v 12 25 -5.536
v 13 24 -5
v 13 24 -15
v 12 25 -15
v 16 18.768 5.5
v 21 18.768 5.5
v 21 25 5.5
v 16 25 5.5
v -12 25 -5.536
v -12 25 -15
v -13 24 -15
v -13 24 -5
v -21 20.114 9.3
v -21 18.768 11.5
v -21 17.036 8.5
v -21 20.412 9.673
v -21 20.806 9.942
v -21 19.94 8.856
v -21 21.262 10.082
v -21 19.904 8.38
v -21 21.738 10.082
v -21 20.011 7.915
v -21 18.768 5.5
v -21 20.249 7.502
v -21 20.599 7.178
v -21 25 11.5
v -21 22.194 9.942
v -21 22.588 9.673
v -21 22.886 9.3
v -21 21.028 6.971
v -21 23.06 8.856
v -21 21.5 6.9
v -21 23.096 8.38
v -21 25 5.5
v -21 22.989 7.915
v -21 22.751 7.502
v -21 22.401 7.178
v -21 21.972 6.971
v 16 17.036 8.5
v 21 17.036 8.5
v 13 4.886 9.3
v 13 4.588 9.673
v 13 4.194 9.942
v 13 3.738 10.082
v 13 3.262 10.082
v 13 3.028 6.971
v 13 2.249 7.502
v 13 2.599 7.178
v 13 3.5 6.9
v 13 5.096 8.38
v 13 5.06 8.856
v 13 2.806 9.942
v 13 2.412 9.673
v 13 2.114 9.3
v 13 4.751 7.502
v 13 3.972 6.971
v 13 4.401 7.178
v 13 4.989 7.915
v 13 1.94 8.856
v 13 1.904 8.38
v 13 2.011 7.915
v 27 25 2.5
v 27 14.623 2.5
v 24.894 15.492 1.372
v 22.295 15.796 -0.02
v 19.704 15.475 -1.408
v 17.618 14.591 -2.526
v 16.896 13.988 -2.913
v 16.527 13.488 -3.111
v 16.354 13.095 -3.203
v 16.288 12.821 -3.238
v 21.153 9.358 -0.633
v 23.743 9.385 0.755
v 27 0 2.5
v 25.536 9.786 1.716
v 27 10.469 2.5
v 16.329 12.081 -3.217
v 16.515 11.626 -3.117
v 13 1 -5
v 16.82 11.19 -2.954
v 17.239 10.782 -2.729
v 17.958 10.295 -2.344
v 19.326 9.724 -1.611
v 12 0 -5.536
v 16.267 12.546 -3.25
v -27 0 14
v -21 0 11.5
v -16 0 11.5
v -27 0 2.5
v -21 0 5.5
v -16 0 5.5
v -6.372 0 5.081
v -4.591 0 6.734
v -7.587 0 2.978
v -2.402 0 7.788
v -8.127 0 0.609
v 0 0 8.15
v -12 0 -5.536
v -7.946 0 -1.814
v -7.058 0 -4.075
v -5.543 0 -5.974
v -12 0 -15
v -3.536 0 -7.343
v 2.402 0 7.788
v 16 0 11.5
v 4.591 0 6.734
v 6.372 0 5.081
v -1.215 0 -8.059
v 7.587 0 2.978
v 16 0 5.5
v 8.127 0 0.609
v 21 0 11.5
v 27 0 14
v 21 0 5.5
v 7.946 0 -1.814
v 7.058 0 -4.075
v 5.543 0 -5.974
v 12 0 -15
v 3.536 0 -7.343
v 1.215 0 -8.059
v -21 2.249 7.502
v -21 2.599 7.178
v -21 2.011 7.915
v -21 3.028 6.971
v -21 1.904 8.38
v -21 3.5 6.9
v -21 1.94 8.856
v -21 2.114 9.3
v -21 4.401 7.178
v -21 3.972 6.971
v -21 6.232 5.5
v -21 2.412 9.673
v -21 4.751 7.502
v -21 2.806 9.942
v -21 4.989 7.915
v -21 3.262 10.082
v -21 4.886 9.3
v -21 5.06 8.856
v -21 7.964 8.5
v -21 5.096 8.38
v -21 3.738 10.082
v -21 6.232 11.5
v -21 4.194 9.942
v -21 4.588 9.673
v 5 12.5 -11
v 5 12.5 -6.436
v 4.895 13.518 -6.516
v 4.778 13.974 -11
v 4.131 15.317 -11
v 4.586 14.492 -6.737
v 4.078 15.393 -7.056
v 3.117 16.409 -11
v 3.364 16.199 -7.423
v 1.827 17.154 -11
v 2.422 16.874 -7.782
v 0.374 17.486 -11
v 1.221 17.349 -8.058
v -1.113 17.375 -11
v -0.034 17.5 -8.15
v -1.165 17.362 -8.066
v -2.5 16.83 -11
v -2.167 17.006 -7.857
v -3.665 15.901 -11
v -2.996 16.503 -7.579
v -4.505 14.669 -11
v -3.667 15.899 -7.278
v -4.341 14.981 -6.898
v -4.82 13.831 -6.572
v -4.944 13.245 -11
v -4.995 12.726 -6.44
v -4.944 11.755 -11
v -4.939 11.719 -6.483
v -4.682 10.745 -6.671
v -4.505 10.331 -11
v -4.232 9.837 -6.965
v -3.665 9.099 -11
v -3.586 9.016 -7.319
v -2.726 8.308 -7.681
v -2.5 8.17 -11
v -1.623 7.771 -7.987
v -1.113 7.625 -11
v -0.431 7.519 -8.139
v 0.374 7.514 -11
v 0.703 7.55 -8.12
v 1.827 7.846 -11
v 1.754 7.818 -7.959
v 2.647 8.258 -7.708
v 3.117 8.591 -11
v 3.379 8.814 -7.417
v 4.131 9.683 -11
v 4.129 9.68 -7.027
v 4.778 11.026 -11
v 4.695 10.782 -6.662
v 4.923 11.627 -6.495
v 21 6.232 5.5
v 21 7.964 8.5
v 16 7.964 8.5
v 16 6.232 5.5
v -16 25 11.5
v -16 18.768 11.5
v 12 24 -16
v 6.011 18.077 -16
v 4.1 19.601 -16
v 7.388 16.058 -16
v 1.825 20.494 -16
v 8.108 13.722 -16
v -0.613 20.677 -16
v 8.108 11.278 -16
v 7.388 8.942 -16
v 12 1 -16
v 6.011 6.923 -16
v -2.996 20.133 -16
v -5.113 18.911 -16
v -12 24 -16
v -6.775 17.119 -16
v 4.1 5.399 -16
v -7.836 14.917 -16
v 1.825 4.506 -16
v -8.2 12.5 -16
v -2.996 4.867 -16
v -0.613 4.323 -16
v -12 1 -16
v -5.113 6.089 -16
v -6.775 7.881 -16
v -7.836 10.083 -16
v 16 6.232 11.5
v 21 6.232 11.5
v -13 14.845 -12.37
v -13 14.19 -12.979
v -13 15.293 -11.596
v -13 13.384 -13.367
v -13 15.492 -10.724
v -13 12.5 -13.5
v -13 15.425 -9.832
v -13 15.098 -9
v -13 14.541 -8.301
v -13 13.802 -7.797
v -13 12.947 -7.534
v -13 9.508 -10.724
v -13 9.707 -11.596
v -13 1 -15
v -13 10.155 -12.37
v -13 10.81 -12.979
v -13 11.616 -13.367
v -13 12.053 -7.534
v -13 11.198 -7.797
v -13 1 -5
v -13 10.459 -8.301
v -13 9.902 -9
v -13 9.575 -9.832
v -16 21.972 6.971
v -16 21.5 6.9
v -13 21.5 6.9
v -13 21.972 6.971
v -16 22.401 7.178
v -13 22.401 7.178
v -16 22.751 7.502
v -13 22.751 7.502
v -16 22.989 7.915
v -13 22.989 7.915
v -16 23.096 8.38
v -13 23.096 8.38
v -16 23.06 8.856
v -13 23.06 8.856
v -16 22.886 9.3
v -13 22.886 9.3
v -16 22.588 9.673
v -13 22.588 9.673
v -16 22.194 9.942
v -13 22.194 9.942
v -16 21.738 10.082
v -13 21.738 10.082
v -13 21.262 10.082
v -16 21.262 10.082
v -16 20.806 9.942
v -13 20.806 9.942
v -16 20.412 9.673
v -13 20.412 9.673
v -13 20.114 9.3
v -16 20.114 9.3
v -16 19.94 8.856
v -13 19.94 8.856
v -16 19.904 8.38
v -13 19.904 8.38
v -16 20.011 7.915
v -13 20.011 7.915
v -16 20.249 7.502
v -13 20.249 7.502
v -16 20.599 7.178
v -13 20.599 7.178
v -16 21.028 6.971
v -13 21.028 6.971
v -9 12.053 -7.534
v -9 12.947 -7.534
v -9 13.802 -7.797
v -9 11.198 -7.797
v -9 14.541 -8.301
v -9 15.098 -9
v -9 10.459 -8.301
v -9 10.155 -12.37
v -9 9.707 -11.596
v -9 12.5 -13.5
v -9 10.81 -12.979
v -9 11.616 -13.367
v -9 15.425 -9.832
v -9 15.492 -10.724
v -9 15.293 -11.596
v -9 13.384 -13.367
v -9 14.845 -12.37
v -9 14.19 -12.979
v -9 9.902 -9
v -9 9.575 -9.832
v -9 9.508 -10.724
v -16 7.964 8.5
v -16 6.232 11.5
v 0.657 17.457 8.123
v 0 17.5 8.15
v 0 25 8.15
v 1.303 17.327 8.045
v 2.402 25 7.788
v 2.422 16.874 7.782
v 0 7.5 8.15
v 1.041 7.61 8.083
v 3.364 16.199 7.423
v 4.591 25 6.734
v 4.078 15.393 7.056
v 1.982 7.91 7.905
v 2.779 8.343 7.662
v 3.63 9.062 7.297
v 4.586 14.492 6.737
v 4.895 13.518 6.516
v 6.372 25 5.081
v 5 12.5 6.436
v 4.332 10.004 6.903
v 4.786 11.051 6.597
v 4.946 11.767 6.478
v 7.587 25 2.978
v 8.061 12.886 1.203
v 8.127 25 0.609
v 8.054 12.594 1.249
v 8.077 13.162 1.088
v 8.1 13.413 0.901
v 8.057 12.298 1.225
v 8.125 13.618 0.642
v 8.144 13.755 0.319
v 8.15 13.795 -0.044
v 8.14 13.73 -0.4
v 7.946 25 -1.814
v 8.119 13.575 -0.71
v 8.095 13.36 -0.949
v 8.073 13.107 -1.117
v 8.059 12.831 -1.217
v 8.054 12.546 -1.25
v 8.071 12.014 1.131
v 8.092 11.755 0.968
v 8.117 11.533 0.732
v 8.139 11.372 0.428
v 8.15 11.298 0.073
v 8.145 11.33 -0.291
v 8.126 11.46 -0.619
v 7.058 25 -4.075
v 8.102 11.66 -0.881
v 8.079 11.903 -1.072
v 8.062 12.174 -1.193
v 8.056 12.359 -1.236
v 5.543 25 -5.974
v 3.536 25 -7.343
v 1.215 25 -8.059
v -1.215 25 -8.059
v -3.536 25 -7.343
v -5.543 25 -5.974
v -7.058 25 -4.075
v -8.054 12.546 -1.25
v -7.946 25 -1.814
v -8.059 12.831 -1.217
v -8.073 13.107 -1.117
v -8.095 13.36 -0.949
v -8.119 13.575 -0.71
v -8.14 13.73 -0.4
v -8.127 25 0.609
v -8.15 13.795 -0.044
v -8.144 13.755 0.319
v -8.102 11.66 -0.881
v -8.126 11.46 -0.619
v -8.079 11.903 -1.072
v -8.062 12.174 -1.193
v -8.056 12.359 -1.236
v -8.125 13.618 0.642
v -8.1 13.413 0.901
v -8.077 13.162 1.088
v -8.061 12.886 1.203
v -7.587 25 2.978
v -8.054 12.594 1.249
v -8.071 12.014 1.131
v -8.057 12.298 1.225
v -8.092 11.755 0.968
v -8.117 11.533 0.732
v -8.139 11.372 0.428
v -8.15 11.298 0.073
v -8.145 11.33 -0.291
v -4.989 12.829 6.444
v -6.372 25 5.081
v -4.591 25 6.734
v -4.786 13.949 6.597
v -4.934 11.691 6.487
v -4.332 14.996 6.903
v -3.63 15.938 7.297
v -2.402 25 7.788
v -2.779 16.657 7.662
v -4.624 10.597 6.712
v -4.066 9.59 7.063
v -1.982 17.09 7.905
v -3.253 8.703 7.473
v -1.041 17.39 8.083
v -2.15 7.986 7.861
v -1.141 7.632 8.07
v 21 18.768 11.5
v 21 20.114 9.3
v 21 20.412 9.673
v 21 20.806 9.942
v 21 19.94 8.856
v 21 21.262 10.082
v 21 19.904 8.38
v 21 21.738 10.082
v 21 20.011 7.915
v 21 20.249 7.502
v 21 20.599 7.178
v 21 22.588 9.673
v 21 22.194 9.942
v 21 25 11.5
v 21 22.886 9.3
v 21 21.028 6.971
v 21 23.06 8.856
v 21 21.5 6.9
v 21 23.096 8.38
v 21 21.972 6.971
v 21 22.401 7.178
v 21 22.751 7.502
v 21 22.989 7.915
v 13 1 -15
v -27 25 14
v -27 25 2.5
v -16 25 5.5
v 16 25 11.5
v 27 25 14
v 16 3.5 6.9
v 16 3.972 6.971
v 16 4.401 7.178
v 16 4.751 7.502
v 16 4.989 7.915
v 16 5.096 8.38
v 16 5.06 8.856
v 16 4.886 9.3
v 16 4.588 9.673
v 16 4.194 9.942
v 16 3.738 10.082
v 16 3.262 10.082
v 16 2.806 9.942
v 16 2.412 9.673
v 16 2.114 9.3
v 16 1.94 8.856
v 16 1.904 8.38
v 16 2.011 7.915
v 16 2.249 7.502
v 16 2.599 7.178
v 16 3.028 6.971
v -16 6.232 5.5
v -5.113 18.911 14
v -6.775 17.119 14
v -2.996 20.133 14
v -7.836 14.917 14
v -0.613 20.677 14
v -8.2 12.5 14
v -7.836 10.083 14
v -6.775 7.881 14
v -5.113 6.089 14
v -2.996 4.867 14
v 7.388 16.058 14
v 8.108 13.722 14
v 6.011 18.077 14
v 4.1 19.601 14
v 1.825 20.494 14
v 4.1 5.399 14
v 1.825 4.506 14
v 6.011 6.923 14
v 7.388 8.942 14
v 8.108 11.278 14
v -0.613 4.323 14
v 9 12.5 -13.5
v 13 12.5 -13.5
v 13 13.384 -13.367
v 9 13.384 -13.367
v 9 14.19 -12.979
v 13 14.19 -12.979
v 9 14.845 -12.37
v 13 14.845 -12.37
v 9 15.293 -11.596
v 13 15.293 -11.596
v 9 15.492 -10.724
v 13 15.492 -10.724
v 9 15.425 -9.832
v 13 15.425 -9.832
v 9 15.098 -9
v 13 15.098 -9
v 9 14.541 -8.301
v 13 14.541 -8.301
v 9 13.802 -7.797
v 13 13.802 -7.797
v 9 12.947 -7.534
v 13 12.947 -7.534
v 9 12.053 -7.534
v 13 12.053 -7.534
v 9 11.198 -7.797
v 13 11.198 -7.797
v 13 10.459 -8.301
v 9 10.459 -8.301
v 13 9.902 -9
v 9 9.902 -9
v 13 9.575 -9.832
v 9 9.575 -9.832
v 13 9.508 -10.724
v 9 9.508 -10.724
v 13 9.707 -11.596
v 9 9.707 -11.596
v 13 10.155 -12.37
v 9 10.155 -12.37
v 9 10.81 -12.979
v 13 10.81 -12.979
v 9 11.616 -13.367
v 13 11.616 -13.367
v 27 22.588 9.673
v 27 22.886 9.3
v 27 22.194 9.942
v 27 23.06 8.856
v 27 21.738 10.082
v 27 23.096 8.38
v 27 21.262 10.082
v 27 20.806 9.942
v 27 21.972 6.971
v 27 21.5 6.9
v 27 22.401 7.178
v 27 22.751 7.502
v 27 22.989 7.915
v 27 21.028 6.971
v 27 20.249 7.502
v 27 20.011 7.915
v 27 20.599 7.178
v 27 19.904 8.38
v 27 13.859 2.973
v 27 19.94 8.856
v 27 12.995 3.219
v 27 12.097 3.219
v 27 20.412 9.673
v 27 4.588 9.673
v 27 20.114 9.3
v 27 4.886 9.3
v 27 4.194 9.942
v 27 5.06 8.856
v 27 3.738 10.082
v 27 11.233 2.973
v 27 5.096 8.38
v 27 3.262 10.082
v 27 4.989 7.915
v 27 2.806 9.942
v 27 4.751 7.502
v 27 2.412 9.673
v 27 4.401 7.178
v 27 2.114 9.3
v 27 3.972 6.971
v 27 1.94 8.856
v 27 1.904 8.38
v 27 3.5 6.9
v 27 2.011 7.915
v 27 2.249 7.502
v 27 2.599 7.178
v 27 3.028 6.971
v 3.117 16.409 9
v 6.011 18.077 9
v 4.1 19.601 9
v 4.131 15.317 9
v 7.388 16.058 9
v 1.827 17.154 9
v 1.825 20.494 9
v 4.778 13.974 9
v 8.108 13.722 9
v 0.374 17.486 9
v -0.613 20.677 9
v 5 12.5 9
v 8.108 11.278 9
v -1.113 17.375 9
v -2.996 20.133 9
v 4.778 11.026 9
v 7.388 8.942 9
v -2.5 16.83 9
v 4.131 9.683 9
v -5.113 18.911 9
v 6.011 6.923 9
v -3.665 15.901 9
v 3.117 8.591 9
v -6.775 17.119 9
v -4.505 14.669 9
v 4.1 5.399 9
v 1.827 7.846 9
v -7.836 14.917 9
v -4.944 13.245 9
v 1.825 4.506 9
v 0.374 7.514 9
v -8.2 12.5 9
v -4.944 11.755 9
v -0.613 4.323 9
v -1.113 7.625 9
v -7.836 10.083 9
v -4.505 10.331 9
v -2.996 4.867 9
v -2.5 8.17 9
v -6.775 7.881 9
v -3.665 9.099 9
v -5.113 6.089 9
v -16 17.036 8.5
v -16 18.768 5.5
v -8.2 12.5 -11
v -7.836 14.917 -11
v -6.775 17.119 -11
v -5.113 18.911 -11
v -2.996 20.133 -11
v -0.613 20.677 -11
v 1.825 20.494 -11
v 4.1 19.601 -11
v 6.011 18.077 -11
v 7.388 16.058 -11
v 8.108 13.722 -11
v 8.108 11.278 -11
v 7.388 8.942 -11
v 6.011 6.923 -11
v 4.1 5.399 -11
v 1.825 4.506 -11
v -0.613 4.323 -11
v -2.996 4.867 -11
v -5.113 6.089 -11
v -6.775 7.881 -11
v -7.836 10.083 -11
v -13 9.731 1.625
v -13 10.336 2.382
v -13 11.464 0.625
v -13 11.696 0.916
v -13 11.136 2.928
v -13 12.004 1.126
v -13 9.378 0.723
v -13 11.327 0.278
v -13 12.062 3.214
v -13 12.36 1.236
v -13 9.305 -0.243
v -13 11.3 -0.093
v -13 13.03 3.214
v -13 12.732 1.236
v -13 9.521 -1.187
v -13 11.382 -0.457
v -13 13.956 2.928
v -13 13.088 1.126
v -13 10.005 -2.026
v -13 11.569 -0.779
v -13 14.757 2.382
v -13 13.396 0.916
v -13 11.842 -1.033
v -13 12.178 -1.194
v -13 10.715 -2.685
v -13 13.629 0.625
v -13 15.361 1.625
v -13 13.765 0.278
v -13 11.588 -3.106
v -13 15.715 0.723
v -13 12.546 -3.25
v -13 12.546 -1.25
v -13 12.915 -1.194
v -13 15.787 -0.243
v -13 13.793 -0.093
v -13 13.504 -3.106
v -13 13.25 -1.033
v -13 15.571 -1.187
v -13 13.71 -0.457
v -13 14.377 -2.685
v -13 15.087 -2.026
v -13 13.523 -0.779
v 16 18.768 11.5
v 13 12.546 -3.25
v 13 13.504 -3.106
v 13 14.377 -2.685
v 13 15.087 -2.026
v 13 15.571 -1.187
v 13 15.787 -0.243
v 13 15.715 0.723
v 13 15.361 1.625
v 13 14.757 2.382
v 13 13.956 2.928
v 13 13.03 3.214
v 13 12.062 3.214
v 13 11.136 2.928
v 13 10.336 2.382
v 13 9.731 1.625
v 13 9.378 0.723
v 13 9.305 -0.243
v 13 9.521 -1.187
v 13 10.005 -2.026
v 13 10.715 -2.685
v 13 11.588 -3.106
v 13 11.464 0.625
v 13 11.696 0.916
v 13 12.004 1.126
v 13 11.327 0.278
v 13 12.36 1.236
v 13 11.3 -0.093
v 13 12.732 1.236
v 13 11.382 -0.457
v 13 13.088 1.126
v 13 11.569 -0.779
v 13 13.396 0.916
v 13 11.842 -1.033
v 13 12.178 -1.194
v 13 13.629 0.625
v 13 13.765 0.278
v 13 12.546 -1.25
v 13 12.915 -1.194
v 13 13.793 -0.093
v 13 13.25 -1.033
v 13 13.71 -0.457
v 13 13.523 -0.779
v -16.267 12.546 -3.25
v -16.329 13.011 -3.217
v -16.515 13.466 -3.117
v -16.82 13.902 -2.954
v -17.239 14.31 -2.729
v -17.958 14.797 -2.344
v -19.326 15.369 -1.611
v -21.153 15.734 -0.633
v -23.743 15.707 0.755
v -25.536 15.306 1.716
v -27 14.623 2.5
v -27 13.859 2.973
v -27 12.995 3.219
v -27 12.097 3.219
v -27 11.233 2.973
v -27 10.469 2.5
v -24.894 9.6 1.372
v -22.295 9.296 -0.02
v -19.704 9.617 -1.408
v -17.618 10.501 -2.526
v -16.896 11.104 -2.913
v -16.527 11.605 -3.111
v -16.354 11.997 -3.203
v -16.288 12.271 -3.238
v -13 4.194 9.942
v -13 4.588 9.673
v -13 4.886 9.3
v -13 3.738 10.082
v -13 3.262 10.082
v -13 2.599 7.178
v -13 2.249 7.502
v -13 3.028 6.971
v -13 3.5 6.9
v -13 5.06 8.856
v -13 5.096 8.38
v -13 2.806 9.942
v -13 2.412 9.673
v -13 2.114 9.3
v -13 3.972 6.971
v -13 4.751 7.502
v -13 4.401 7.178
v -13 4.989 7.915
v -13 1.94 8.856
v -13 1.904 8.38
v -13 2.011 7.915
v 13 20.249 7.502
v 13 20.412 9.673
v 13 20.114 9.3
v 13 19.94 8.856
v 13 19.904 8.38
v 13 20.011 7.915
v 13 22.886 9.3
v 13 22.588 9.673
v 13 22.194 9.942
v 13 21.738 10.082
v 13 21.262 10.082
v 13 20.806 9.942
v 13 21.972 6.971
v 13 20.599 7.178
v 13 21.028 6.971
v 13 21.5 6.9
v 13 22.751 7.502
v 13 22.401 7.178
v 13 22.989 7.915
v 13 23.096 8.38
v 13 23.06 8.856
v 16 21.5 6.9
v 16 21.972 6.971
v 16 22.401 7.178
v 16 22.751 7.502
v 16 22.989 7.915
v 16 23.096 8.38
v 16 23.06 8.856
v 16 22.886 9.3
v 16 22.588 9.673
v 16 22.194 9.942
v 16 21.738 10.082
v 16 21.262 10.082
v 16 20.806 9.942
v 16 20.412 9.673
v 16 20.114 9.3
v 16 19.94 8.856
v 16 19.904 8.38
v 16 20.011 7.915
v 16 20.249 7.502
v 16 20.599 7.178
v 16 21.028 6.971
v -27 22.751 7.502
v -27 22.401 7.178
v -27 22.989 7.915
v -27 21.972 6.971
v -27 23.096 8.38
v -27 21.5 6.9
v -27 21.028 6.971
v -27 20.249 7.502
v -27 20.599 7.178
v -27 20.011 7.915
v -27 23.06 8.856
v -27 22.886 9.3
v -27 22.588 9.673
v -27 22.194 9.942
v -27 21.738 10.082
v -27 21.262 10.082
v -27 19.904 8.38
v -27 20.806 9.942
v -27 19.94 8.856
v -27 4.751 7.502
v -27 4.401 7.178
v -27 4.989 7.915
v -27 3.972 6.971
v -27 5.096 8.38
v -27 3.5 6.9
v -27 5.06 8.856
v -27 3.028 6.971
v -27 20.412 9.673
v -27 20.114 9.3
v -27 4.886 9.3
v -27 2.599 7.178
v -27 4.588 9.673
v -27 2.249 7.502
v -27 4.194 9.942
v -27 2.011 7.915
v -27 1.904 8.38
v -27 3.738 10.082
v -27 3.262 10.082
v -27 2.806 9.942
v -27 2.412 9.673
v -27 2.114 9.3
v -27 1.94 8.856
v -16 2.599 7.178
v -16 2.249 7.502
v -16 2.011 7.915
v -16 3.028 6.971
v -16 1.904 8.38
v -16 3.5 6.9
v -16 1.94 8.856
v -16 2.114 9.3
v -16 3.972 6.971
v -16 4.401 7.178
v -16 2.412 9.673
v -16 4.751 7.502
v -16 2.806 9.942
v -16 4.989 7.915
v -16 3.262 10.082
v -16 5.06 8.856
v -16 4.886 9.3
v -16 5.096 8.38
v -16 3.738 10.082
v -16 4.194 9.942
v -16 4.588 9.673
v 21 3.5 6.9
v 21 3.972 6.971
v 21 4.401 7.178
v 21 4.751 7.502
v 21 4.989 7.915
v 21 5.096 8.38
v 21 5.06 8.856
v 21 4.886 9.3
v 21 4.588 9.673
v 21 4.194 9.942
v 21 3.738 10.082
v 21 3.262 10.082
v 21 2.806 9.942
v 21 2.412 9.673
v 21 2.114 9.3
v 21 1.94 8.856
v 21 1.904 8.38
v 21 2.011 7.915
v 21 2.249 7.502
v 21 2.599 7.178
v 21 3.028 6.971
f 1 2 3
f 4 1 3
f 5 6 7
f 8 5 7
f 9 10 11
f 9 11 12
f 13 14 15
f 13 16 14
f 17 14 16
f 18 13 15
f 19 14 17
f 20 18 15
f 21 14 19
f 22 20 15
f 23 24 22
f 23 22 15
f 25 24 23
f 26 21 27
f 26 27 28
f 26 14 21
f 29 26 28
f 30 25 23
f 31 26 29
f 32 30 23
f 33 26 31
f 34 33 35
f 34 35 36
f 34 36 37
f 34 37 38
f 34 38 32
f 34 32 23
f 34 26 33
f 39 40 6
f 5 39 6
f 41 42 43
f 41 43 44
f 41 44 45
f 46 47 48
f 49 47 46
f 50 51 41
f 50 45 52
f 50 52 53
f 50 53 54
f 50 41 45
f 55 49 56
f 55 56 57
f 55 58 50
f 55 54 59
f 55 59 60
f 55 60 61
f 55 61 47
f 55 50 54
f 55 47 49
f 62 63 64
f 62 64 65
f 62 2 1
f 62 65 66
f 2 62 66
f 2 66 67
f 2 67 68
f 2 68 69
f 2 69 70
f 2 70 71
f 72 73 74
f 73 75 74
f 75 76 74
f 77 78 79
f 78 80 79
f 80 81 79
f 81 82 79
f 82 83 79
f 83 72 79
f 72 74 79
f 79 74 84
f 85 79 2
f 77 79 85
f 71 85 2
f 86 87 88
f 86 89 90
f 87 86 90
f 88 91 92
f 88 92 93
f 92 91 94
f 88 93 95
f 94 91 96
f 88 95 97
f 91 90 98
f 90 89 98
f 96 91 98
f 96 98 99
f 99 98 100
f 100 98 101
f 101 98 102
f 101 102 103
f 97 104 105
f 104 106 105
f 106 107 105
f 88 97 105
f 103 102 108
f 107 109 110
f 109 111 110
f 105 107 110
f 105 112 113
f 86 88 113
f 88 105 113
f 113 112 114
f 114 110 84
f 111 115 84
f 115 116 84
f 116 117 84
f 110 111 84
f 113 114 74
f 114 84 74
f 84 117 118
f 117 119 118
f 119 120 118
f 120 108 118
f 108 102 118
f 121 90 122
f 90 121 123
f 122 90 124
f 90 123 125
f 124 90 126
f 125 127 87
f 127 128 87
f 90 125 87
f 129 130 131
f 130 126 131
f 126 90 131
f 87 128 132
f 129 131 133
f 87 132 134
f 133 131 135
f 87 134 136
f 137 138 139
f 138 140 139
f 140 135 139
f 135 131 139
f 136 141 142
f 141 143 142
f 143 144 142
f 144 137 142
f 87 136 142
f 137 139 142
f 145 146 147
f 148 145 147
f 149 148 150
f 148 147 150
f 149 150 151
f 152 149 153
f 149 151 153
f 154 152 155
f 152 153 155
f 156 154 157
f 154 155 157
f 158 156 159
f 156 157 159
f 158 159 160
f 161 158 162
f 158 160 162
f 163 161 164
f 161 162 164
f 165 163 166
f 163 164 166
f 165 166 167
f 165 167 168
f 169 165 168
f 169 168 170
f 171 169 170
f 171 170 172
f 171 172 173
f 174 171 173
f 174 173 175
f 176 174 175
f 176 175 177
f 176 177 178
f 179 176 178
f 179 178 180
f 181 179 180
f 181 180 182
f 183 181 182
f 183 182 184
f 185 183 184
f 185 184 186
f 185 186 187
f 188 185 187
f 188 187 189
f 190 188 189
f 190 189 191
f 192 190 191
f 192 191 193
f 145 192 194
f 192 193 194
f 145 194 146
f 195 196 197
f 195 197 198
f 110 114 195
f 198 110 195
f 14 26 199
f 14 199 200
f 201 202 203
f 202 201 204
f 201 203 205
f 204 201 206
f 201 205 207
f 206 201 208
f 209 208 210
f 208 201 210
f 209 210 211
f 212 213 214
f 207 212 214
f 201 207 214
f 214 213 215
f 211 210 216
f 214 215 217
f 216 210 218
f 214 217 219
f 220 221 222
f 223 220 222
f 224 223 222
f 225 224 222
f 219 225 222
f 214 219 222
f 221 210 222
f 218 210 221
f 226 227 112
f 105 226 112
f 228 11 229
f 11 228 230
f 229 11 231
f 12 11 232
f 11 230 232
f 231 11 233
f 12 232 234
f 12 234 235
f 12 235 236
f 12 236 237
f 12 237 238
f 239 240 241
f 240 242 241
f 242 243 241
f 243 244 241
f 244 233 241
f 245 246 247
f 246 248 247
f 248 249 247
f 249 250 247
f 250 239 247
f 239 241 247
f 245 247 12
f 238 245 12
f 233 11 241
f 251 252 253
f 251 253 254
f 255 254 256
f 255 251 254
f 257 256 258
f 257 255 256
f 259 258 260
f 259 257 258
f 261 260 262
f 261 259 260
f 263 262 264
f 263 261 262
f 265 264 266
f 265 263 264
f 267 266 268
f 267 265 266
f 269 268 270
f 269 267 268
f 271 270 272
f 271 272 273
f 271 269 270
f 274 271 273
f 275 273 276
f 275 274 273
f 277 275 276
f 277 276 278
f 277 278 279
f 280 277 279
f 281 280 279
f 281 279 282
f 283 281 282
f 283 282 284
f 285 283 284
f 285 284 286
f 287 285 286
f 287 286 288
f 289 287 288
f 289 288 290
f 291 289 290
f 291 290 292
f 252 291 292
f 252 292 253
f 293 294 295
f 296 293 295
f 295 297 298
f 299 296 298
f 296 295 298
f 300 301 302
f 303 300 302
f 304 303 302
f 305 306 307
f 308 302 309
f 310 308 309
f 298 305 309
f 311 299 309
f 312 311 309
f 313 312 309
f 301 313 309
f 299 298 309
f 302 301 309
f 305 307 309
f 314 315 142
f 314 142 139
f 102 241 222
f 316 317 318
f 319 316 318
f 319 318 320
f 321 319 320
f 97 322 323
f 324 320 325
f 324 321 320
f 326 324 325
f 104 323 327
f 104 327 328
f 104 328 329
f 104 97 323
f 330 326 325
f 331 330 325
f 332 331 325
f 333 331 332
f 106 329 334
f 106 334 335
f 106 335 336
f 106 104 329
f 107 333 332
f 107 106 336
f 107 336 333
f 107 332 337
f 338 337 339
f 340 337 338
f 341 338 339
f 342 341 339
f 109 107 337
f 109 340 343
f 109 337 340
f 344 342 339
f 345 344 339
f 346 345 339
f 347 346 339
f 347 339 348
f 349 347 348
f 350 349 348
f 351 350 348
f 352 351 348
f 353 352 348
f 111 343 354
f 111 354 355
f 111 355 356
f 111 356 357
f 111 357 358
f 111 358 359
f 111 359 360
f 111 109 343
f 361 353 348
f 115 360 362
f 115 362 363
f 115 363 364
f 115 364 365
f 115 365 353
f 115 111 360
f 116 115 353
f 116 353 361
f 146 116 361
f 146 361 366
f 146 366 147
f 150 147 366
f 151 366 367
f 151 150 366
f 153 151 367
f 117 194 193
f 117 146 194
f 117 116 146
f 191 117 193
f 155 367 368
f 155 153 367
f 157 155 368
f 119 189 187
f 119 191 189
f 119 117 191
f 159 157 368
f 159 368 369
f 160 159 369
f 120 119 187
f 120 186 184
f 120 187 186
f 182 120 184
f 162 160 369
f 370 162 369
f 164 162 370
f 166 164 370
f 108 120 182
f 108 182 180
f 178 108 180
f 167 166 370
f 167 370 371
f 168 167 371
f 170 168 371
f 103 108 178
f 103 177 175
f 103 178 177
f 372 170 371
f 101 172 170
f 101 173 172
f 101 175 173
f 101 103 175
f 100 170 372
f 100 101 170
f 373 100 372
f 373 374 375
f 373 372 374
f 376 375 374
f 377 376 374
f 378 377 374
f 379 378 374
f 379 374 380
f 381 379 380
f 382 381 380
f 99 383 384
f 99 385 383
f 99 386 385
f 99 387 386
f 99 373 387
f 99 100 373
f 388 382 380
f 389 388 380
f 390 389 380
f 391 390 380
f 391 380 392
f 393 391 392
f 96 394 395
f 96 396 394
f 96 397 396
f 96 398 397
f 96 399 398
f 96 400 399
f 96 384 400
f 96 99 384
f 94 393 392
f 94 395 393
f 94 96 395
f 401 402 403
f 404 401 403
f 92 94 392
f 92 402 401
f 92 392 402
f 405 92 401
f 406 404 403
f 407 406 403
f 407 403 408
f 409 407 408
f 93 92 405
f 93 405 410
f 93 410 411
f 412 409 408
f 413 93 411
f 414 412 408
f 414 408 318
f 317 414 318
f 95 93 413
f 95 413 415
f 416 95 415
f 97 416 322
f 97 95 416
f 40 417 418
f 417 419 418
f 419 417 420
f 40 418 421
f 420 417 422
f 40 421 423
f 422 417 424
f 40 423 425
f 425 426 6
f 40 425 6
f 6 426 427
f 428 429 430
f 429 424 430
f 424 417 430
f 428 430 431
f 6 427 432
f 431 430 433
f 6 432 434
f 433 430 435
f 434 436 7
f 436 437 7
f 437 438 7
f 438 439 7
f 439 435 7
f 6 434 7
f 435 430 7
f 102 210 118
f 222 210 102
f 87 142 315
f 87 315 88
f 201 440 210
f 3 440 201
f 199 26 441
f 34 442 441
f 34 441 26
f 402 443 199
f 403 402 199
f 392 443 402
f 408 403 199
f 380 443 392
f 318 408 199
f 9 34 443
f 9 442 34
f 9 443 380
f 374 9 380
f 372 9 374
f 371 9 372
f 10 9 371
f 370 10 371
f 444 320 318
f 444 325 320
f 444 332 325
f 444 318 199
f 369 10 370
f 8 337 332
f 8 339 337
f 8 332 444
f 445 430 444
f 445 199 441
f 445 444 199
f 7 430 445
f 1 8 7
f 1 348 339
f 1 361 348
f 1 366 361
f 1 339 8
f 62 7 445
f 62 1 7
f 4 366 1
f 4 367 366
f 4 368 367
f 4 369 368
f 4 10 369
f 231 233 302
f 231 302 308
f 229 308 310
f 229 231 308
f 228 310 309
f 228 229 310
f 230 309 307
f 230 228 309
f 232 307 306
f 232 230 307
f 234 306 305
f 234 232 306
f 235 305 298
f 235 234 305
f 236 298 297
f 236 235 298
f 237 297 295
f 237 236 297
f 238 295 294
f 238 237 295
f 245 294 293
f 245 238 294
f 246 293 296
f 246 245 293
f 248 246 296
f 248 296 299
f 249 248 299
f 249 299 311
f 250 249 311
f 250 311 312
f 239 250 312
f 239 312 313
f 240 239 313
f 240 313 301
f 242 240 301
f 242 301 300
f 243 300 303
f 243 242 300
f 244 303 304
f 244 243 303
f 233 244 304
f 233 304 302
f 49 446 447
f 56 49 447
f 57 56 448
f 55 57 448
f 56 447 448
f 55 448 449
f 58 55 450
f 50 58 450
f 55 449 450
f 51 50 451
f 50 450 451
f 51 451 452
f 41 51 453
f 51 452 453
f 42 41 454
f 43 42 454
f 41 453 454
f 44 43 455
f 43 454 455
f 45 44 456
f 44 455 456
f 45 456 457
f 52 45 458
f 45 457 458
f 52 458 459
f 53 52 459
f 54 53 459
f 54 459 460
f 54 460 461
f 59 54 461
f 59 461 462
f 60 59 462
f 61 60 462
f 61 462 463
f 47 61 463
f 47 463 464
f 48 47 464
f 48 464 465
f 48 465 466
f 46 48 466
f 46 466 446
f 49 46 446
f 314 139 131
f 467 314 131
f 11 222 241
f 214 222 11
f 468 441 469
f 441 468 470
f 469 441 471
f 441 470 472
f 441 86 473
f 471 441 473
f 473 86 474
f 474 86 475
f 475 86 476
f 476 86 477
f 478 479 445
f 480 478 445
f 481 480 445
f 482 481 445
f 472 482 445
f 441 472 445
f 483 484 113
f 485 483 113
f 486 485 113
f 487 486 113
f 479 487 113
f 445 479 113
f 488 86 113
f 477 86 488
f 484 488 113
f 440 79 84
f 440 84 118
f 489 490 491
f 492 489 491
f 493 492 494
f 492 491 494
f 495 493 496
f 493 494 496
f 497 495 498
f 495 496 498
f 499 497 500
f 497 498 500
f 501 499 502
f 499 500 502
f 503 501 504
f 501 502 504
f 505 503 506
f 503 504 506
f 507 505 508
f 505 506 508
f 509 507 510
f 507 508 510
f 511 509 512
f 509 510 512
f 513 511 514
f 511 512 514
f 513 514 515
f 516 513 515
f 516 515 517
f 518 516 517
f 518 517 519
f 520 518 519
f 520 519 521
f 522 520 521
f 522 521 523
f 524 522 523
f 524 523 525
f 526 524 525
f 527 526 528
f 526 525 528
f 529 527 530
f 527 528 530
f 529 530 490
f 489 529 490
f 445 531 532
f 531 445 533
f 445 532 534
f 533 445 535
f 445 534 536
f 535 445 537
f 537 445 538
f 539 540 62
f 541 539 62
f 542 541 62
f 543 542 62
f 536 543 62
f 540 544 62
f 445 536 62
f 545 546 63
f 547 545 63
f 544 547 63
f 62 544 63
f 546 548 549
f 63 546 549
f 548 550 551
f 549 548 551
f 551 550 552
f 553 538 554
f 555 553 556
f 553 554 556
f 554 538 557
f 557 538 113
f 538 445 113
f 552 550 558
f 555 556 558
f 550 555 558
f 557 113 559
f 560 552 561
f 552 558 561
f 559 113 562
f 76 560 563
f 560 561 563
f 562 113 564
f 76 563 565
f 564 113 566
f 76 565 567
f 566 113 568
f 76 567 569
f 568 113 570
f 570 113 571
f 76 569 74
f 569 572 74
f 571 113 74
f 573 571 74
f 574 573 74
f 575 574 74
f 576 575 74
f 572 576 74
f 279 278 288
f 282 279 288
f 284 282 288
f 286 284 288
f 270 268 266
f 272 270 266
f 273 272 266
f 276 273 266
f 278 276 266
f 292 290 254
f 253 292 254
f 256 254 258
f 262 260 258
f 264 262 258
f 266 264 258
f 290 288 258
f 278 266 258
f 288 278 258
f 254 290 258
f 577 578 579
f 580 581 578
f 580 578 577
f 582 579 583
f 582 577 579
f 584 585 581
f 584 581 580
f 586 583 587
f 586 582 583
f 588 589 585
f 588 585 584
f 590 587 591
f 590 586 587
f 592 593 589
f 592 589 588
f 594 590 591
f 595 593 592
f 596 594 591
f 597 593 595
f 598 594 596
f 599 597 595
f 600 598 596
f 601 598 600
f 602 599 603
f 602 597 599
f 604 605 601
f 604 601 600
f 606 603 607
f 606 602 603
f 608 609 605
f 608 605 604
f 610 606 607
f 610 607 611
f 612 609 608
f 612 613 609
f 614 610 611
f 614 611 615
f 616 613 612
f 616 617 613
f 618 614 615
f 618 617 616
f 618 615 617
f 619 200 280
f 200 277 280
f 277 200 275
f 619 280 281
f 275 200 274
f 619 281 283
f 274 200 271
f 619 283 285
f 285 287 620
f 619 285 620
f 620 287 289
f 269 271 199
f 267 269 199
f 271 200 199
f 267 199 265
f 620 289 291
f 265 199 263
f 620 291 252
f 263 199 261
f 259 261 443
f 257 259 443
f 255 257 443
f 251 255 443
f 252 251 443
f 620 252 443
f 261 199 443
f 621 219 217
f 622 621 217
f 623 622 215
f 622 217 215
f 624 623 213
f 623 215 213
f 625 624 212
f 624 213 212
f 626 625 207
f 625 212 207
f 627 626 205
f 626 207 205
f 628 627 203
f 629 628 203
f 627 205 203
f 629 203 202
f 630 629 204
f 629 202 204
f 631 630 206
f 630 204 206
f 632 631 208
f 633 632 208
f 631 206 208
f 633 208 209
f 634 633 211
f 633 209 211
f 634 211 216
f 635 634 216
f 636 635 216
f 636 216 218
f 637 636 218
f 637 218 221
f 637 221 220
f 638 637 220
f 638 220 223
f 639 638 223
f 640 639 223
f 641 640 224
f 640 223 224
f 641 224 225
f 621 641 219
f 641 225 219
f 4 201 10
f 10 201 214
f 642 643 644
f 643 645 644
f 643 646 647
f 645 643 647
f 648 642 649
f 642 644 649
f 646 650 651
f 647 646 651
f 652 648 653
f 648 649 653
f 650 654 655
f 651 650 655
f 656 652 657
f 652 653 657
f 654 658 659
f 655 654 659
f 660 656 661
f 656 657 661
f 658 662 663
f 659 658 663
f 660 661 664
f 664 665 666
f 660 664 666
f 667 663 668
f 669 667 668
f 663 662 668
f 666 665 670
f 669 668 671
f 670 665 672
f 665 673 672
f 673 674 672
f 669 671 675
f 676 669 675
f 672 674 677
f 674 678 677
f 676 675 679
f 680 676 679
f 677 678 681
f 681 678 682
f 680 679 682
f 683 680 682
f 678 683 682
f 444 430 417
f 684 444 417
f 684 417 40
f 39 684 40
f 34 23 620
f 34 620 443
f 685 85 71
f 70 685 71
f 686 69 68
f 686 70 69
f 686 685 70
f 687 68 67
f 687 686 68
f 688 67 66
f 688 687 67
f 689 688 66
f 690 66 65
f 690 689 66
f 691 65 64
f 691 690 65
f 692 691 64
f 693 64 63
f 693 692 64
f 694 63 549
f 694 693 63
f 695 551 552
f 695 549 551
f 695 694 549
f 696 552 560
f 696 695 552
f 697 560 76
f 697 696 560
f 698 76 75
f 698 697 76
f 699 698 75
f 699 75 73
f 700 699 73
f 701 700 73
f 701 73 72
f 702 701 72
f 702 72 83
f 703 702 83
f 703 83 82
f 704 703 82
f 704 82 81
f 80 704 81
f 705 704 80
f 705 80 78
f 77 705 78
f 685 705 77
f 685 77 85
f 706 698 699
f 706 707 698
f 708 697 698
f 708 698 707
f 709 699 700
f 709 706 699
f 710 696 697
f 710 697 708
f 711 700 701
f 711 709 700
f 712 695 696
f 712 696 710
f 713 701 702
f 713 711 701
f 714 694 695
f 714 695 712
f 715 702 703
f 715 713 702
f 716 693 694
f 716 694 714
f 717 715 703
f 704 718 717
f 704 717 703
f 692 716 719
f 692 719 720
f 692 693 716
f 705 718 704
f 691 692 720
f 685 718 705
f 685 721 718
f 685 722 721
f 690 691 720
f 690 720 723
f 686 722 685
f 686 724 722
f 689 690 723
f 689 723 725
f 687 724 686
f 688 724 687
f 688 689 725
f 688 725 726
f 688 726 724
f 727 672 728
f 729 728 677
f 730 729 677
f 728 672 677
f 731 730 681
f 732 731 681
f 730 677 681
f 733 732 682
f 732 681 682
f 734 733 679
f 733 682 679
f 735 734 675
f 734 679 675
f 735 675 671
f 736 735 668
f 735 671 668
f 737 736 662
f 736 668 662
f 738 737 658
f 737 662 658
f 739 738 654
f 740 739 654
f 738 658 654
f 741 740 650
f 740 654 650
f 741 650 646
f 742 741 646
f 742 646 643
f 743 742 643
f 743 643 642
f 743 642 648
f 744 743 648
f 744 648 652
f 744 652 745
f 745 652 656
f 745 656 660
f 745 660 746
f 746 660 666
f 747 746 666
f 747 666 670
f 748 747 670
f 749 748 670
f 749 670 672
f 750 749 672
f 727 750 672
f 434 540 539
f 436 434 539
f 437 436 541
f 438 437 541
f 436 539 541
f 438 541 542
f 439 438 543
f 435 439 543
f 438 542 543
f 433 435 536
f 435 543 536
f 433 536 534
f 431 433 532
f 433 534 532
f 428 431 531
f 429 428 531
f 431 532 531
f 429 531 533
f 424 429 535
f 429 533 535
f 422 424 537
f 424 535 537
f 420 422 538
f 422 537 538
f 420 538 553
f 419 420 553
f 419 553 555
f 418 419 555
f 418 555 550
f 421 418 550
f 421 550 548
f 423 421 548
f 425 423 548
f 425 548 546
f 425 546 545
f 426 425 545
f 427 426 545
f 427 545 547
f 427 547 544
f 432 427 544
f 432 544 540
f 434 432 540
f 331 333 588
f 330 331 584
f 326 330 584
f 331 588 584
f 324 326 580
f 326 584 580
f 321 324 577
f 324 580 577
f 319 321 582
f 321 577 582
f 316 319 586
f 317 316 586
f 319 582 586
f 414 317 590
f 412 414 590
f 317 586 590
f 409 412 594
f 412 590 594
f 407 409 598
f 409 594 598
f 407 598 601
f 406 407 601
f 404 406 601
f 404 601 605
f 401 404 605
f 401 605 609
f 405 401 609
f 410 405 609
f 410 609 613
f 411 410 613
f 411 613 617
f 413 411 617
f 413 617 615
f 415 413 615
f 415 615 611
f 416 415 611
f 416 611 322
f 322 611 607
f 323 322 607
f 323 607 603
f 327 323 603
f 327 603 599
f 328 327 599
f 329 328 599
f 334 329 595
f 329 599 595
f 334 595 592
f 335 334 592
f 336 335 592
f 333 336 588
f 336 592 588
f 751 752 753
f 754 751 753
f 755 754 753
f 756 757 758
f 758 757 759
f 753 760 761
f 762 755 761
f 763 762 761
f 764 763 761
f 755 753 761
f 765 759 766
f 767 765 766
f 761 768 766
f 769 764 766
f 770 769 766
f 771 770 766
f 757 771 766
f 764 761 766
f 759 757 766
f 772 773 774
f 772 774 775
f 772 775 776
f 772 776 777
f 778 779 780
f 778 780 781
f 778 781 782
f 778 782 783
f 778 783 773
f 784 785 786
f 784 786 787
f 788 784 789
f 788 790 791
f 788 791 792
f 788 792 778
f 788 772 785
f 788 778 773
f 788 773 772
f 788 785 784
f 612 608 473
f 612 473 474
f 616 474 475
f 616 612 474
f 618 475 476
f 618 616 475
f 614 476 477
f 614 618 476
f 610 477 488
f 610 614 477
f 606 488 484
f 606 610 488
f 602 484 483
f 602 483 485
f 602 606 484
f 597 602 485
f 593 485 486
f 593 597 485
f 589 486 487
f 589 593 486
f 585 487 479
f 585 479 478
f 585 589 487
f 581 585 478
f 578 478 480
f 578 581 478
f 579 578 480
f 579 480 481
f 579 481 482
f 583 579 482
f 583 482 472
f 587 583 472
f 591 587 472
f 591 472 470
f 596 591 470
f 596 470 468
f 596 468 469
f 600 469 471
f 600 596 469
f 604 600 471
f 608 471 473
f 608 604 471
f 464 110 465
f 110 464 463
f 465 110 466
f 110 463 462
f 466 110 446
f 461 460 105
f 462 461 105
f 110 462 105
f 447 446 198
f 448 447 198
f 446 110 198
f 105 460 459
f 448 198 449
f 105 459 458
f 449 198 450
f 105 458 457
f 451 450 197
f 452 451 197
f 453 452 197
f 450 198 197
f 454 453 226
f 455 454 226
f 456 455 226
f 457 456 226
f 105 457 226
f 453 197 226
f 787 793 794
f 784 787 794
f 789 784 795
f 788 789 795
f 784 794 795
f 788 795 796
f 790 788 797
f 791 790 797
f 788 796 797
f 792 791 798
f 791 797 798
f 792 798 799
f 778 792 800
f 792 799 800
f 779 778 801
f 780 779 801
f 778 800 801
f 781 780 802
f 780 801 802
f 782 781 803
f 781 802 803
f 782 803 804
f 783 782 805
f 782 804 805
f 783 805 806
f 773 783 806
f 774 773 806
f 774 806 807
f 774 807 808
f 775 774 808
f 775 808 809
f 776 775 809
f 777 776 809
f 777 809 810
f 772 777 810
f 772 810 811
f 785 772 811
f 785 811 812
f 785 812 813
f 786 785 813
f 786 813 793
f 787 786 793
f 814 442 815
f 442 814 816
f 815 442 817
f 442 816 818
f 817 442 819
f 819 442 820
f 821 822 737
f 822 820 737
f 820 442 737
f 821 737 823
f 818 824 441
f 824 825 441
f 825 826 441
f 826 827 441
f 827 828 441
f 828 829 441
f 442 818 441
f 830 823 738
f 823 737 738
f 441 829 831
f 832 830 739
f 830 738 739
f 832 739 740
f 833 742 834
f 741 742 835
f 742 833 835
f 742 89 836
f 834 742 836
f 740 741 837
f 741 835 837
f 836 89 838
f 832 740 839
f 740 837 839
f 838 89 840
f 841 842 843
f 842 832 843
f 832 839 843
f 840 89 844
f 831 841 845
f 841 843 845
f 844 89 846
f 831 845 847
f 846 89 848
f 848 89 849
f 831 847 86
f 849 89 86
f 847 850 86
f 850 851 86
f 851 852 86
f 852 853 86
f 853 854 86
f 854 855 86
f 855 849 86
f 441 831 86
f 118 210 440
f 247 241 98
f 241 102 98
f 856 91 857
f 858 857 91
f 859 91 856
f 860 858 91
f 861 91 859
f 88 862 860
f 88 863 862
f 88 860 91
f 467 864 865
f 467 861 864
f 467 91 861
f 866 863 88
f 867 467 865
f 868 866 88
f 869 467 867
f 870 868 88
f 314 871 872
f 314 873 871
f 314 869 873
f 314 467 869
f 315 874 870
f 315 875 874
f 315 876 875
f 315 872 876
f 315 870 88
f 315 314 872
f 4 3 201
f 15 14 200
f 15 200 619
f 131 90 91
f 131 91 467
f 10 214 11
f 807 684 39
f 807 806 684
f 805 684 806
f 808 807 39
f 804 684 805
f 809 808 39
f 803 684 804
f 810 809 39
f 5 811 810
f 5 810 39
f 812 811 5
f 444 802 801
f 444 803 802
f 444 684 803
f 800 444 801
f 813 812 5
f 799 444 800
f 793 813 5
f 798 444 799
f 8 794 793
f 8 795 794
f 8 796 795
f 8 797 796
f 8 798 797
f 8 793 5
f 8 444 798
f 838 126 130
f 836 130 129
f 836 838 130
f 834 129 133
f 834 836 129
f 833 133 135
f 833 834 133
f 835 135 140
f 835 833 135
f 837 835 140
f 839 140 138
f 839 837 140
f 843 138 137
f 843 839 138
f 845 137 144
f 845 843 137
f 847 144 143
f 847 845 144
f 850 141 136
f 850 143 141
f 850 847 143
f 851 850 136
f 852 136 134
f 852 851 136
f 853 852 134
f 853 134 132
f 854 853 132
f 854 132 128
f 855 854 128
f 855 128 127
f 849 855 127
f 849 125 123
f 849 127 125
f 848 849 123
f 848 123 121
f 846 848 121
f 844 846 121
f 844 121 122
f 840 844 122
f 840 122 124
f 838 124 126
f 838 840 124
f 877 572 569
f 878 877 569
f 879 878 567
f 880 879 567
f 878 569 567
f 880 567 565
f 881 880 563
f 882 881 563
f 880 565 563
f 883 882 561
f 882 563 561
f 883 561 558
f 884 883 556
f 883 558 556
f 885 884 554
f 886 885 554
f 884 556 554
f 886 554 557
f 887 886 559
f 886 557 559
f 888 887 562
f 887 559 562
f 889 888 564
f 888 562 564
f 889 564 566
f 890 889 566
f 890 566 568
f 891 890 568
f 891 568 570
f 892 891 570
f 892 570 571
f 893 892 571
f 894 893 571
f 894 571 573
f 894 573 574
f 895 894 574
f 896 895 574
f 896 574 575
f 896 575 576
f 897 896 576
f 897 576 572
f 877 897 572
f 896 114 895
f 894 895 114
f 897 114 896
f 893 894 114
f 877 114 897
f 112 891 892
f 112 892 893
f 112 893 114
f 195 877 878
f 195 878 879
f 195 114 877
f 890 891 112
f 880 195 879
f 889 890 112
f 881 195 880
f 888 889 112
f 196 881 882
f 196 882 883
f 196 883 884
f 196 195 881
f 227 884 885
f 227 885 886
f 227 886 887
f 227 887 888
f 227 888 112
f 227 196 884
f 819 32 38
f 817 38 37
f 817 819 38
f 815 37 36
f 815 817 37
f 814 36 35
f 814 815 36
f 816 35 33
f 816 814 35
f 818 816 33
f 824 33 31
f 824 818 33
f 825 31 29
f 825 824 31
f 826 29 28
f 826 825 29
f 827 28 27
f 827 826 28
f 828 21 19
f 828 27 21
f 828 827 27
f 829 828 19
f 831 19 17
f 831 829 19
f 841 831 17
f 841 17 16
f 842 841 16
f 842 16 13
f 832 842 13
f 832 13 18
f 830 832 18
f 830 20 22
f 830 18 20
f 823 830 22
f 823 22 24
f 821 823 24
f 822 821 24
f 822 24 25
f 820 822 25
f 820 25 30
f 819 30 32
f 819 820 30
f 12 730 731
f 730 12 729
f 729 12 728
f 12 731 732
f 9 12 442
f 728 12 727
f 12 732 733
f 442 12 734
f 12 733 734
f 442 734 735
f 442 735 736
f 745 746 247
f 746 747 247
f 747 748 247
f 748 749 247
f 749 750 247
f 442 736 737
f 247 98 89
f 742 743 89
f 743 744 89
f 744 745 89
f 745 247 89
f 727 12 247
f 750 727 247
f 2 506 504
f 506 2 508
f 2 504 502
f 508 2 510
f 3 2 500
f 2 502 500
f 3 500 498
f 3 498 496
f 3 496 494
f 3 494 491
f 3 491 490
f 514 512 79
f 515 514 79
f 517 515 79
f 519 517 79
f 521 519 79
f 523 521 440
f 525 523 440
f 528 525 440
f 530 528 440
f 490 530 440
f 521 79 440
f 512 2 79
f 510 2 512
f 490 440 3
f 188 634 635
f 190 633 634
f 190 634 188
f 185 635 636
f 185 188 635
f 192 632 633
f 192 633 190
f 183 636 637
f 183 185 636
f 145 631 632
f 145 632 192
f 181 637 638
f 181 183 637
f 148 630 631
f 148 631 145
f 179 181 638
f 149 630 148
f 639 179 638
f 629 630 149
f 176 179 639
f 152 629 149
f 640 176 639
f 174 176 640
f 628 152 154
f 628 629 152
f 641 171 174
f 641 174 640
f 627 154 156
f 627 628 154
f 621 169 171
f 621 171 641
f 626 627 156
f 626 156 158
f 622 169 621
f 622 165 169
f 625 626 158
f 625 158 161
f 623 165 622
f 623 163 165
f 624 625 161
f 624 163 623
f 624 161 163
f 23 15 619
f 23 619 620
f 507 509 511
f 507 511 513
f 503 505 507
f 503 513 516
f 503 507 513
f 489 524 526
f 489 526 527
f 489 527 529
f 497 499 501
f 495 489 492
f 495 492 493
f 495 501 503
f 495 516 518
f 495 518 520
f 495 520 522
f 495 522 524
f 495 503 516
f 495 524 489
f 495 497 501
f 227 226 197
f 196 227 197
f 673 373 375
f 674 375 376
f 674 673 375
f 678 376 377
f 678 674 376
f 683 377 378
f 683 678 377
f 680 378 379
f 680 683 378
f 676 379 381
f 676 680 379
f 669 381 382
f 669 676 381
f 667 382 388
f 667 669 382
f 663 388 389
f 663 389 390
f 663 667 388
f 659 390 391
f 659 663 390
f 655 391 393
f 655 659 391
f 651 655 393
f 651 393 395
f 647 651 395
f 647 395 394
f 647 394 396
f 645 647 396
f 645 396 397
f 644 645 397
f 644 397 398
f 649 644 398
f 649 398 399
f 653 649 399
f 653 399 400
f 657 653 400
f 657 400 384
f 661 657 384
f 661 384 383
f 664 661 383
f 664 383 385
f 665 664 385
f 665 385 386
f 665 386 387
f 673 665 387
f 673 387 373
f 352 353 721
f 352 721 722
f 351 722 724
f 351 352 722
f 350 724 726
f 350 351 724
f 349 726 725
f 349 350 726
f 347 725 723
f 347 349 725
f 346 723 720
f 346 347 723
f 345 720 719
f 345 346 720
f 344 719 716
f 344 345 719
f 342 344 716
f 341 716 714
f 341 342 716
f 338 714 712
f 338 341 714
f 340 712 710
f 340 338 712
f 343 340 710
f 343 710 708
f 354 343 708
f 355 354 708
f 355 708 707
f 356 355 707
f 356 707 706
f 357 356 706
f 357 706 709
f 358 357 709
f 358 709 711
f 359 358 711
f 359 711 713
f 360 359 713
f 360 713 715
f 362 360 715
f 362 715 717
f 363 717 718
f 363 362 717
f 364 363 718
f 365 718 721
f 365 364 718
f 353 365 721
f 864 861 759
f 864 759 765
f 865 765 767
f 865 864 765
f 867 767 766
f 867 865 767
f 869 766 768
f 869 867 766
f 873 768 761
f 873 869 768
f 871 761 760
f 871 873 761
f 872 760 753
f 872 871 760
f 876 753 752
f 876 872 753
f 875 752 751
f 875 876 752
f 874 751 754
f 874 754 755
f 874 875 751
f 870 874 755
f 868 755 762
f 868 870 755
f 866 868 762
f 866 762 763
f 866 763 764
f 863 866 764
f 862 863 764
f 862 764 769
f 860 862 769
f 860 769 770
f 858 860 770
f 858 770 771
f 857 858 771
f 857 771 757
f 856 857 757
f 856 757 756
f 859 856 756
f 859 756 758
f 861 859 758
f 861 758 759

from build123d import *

# Parameters (mm, degrees)
SKETCH1_R               = 8.15
BOSS_EXTRUDE1_DEPTH     = 25
SKETCH2_R               = 5
CUT_EXTRUDE1_DEPTH      = 48.476309882
SKETCH3_R               = 8.2
CUT_EXTRUDE2_DEPTH      = 5
CUT_EXTRUDE3_START      = -5
SKETCH4_R               = 8.2
CUT_EXTRUDE3_DEPTH      = 5
CHAMFER1_SIZE           = 1
CUT_EXTRUDE4_DEPTH      = 41.124805358
CUT_EXTRUDE4_DEPTH_BACK = 41.124805358
SKETCH5_R               = 1.25
CUT_EXTRUDE5_START      = -13
SKETCH6_R               = 3.25
CUT_EXTRUDE5_DEPTH      = 28.124805358
SKETCH7_R               = 3
CUT_EXTRUDE6_DEPTH      = 4
SKETCH9_R               = 1.6
CUT_EXTRUDE7_DEPTH      = 14
CUT_EXTRUDE8_START      = -6
CUT_EXTRUDE8_DEPTH      = 5


with BuildPart() as part:
    # Sketch1 → Boss-Extrude1 (new body)
    with BuildSketch(Plane(origin=(0, 0, 0), x_dir=(1, 0, 0), z_dir=(0, 1, 0))):
        Polygon((-13, 14), (-13, 5), (-27, -2.5), (-27, -14), (27, -14), (27, -2.5), (13, 5), (13, 14), (13, 16), (-13, 16), align=None)
        with Locations(Location((0, 0, 0), (0, 0, 270))):
            Circle(SKETCH1_R, mode=Mode.SUBTRACT)
    extrude(amount=BOSS_EXTRUDE1_DEPTH)

    # Sketch2 → Cut-Extrude1 (cut, through all)
    with BuildSketch(Plane.XY.offset(14)):
        with Locations((0, 12.5)):
            Circle(SKETCH2_R)
    extrude(amount=-CUT_EXTRUDE1_DEPTH, mode=Mode.SUBTRACT)

    # Sketch3 → Cut-Extrude2 (cut)
    with BuildSketch(Plane(origin=(0, 0, -16), x_dir=(-1, 0, 0), z_dir=(0, 0, -1))):
        with Locations((0, 12.5)):
            Circle(SKETCH3_R)
    extrude(amount=-CUT_EXTRUDE2_DEPTH, mode=Mode.SUBTRACT)

    # Sketch4 → Cut-Extrude3 (cut)
    with BuildSketch(Plane.XY.offset(14).offset(CUT_EXTRUDE3_START)):
        with Locations(Location((0, 12.5, 0), (0, 0, 180))):
            Circle(SKETCH4_R)
    extrude(amount=CUT_EXTRUDE3_DEPTH, mode=Mode.SUBTRACT)

    # Chamfer1
    chamfer1_edges = [part.edges().sort_by_distance(p)[0] for p in [
        (-13, 0, -10.5),
        (-13, 12.5, -16),
        (13, 12.5, -16),
        (13, 25, -10.5),
        (0, 25, -16),
        (-13, 25, -10.5),
        (0, 0, -16),
        (13, 0, -10.5),
    ]]
    chamfer(chamfer1_edges, length=CHAMFER1_SIZE)

    # Sketch5 → Cut-Extrude4 (cut, two sides: drawn at the far end of the back side and taken through both)
    with BuildSketch(Plane(origin=(0, 0, 0), x_dir=(0, 0, -1), z_dir=(1, 0, 0)).offset(-CUT_EXTRUDE4_DEPTH_BACK)):
        with Locations((0, 12.546077806)):
            Circle(SKETCH5_R)
    extrude(amount=CUT_EXTRUDE4_DEPTH + CUT_EXTRUDE4_DEPTH_BACK, mode=Mode.SUBTRACT)

    # Sketch6 → Cut-Extrude5 (cut, through all)
    with BuildSketch(Plane(origin=(0, 0, 0), x_dir=(0, 0, -1), z_dir=(1, 0, 0)).offset(CUT_EXTRUDE5_START)):
        with Locations((0, 12.546077806)):
            Circle(SKETCH6_R)
    cut_extrude5 = extrude(amount=-CUT_EXTRUDE5_DEPTH, mode=Mode.SUBTRACT)

    # Mirror1: Cut-Extrude5 across plane
    add(cut_extrude5.mirror(Plane(origin=(0, 0, 0), x_dir=(0, 0, 1), z_dir=(1, 0, 0))), mode=Mode.SUBTRACT)

    # Sketch7 → Cut-Extrude6 (cut)
    with BuildSketch(Plane(origin=(13, 0, 0), x_dir=(0, 0, -1), z_dir=(1, 0, 0))):
        with Locations((10.5, 12.5)):
            Circle(SKETCH7_R)
    cut_extrude6 = extrude(amount=-CUT_EXTRUDE6_DEPTH, mode=Mode.SUBTRACT)

    # Sketch9 → Cut-Extrude7 (cut)
    with BuildSketch(Plane(origin=(27, 0, 0), x_dir=(0, 0, -1), z_dir=(1, 0, 0))):
        with Locations((-8.5, 21.5)):
            Circle(SKETCH9_R)
        with Locations((-8.5, 3.5)):
            Circle(SKETCH9_R)
    cut_extrude7 = extrude(amount=-CUT_EXTRUDE7_DEPTH, mode=Mode.SUBTRACT)

    # Sketch10 → Cut-Extrude8 (cut)
    with BuildSketch(Plane(origin=(27, 0, 0), x_dir=(0, 0, -1), z_dir=(1, 0, 0)).offset(CUT_EXTRUDE8_START)):
        Polygon((-11.5, 19.767949192), (-11.5, 18.767949192), (-8.5, 17.035898385), (-5.5, 18.767949192), (-5.5, 19.767949192), (-5.5, 23.232050808), (-5.5, 25), (-11.5, 25), (-11.5, 23.232050808), align=None)
        Polygon((-11.5, 0), (-11.5, 1.767949192), (-11.5, 5.232050808), (-11.5, 6.232050808), (-8.5, 7.964101615), (-5.5, 6.232050808), (-5.5, 5.232050808), (-5.5, 1.767949192), (-5.5, 0), align=None)
    cut_extrude8 = extrude(amount=-CUT_EXTRUDE8_DEPTH, mode=Mode.SUBTRACT)

    # Mirror2: Cut-Extrude6, Cut-Extrude7, Cut-Extrude8 across plane
    add(cut_extrude6.mirror(Plane(origin=(0, 0, 0), x_dir=(0, 0, 1), z_dir=(1, 0, 0))), mode=Mode.SUBTRACT)
    add(cut_extrude7.mirror(Plane(origin=(0, 0, 0), x_dir=(0, 0, 1), z_dir=(1, 0, 0))), mode=Mode.SUBTRACT)
    add(cut_extrude8.mirror(Plane(origin=(0, 0, 0), x_dir=(0, 0, 1), z_dir=(1, 0, 0))), mode=Mode.SUBTRACT)


solid = part.part
